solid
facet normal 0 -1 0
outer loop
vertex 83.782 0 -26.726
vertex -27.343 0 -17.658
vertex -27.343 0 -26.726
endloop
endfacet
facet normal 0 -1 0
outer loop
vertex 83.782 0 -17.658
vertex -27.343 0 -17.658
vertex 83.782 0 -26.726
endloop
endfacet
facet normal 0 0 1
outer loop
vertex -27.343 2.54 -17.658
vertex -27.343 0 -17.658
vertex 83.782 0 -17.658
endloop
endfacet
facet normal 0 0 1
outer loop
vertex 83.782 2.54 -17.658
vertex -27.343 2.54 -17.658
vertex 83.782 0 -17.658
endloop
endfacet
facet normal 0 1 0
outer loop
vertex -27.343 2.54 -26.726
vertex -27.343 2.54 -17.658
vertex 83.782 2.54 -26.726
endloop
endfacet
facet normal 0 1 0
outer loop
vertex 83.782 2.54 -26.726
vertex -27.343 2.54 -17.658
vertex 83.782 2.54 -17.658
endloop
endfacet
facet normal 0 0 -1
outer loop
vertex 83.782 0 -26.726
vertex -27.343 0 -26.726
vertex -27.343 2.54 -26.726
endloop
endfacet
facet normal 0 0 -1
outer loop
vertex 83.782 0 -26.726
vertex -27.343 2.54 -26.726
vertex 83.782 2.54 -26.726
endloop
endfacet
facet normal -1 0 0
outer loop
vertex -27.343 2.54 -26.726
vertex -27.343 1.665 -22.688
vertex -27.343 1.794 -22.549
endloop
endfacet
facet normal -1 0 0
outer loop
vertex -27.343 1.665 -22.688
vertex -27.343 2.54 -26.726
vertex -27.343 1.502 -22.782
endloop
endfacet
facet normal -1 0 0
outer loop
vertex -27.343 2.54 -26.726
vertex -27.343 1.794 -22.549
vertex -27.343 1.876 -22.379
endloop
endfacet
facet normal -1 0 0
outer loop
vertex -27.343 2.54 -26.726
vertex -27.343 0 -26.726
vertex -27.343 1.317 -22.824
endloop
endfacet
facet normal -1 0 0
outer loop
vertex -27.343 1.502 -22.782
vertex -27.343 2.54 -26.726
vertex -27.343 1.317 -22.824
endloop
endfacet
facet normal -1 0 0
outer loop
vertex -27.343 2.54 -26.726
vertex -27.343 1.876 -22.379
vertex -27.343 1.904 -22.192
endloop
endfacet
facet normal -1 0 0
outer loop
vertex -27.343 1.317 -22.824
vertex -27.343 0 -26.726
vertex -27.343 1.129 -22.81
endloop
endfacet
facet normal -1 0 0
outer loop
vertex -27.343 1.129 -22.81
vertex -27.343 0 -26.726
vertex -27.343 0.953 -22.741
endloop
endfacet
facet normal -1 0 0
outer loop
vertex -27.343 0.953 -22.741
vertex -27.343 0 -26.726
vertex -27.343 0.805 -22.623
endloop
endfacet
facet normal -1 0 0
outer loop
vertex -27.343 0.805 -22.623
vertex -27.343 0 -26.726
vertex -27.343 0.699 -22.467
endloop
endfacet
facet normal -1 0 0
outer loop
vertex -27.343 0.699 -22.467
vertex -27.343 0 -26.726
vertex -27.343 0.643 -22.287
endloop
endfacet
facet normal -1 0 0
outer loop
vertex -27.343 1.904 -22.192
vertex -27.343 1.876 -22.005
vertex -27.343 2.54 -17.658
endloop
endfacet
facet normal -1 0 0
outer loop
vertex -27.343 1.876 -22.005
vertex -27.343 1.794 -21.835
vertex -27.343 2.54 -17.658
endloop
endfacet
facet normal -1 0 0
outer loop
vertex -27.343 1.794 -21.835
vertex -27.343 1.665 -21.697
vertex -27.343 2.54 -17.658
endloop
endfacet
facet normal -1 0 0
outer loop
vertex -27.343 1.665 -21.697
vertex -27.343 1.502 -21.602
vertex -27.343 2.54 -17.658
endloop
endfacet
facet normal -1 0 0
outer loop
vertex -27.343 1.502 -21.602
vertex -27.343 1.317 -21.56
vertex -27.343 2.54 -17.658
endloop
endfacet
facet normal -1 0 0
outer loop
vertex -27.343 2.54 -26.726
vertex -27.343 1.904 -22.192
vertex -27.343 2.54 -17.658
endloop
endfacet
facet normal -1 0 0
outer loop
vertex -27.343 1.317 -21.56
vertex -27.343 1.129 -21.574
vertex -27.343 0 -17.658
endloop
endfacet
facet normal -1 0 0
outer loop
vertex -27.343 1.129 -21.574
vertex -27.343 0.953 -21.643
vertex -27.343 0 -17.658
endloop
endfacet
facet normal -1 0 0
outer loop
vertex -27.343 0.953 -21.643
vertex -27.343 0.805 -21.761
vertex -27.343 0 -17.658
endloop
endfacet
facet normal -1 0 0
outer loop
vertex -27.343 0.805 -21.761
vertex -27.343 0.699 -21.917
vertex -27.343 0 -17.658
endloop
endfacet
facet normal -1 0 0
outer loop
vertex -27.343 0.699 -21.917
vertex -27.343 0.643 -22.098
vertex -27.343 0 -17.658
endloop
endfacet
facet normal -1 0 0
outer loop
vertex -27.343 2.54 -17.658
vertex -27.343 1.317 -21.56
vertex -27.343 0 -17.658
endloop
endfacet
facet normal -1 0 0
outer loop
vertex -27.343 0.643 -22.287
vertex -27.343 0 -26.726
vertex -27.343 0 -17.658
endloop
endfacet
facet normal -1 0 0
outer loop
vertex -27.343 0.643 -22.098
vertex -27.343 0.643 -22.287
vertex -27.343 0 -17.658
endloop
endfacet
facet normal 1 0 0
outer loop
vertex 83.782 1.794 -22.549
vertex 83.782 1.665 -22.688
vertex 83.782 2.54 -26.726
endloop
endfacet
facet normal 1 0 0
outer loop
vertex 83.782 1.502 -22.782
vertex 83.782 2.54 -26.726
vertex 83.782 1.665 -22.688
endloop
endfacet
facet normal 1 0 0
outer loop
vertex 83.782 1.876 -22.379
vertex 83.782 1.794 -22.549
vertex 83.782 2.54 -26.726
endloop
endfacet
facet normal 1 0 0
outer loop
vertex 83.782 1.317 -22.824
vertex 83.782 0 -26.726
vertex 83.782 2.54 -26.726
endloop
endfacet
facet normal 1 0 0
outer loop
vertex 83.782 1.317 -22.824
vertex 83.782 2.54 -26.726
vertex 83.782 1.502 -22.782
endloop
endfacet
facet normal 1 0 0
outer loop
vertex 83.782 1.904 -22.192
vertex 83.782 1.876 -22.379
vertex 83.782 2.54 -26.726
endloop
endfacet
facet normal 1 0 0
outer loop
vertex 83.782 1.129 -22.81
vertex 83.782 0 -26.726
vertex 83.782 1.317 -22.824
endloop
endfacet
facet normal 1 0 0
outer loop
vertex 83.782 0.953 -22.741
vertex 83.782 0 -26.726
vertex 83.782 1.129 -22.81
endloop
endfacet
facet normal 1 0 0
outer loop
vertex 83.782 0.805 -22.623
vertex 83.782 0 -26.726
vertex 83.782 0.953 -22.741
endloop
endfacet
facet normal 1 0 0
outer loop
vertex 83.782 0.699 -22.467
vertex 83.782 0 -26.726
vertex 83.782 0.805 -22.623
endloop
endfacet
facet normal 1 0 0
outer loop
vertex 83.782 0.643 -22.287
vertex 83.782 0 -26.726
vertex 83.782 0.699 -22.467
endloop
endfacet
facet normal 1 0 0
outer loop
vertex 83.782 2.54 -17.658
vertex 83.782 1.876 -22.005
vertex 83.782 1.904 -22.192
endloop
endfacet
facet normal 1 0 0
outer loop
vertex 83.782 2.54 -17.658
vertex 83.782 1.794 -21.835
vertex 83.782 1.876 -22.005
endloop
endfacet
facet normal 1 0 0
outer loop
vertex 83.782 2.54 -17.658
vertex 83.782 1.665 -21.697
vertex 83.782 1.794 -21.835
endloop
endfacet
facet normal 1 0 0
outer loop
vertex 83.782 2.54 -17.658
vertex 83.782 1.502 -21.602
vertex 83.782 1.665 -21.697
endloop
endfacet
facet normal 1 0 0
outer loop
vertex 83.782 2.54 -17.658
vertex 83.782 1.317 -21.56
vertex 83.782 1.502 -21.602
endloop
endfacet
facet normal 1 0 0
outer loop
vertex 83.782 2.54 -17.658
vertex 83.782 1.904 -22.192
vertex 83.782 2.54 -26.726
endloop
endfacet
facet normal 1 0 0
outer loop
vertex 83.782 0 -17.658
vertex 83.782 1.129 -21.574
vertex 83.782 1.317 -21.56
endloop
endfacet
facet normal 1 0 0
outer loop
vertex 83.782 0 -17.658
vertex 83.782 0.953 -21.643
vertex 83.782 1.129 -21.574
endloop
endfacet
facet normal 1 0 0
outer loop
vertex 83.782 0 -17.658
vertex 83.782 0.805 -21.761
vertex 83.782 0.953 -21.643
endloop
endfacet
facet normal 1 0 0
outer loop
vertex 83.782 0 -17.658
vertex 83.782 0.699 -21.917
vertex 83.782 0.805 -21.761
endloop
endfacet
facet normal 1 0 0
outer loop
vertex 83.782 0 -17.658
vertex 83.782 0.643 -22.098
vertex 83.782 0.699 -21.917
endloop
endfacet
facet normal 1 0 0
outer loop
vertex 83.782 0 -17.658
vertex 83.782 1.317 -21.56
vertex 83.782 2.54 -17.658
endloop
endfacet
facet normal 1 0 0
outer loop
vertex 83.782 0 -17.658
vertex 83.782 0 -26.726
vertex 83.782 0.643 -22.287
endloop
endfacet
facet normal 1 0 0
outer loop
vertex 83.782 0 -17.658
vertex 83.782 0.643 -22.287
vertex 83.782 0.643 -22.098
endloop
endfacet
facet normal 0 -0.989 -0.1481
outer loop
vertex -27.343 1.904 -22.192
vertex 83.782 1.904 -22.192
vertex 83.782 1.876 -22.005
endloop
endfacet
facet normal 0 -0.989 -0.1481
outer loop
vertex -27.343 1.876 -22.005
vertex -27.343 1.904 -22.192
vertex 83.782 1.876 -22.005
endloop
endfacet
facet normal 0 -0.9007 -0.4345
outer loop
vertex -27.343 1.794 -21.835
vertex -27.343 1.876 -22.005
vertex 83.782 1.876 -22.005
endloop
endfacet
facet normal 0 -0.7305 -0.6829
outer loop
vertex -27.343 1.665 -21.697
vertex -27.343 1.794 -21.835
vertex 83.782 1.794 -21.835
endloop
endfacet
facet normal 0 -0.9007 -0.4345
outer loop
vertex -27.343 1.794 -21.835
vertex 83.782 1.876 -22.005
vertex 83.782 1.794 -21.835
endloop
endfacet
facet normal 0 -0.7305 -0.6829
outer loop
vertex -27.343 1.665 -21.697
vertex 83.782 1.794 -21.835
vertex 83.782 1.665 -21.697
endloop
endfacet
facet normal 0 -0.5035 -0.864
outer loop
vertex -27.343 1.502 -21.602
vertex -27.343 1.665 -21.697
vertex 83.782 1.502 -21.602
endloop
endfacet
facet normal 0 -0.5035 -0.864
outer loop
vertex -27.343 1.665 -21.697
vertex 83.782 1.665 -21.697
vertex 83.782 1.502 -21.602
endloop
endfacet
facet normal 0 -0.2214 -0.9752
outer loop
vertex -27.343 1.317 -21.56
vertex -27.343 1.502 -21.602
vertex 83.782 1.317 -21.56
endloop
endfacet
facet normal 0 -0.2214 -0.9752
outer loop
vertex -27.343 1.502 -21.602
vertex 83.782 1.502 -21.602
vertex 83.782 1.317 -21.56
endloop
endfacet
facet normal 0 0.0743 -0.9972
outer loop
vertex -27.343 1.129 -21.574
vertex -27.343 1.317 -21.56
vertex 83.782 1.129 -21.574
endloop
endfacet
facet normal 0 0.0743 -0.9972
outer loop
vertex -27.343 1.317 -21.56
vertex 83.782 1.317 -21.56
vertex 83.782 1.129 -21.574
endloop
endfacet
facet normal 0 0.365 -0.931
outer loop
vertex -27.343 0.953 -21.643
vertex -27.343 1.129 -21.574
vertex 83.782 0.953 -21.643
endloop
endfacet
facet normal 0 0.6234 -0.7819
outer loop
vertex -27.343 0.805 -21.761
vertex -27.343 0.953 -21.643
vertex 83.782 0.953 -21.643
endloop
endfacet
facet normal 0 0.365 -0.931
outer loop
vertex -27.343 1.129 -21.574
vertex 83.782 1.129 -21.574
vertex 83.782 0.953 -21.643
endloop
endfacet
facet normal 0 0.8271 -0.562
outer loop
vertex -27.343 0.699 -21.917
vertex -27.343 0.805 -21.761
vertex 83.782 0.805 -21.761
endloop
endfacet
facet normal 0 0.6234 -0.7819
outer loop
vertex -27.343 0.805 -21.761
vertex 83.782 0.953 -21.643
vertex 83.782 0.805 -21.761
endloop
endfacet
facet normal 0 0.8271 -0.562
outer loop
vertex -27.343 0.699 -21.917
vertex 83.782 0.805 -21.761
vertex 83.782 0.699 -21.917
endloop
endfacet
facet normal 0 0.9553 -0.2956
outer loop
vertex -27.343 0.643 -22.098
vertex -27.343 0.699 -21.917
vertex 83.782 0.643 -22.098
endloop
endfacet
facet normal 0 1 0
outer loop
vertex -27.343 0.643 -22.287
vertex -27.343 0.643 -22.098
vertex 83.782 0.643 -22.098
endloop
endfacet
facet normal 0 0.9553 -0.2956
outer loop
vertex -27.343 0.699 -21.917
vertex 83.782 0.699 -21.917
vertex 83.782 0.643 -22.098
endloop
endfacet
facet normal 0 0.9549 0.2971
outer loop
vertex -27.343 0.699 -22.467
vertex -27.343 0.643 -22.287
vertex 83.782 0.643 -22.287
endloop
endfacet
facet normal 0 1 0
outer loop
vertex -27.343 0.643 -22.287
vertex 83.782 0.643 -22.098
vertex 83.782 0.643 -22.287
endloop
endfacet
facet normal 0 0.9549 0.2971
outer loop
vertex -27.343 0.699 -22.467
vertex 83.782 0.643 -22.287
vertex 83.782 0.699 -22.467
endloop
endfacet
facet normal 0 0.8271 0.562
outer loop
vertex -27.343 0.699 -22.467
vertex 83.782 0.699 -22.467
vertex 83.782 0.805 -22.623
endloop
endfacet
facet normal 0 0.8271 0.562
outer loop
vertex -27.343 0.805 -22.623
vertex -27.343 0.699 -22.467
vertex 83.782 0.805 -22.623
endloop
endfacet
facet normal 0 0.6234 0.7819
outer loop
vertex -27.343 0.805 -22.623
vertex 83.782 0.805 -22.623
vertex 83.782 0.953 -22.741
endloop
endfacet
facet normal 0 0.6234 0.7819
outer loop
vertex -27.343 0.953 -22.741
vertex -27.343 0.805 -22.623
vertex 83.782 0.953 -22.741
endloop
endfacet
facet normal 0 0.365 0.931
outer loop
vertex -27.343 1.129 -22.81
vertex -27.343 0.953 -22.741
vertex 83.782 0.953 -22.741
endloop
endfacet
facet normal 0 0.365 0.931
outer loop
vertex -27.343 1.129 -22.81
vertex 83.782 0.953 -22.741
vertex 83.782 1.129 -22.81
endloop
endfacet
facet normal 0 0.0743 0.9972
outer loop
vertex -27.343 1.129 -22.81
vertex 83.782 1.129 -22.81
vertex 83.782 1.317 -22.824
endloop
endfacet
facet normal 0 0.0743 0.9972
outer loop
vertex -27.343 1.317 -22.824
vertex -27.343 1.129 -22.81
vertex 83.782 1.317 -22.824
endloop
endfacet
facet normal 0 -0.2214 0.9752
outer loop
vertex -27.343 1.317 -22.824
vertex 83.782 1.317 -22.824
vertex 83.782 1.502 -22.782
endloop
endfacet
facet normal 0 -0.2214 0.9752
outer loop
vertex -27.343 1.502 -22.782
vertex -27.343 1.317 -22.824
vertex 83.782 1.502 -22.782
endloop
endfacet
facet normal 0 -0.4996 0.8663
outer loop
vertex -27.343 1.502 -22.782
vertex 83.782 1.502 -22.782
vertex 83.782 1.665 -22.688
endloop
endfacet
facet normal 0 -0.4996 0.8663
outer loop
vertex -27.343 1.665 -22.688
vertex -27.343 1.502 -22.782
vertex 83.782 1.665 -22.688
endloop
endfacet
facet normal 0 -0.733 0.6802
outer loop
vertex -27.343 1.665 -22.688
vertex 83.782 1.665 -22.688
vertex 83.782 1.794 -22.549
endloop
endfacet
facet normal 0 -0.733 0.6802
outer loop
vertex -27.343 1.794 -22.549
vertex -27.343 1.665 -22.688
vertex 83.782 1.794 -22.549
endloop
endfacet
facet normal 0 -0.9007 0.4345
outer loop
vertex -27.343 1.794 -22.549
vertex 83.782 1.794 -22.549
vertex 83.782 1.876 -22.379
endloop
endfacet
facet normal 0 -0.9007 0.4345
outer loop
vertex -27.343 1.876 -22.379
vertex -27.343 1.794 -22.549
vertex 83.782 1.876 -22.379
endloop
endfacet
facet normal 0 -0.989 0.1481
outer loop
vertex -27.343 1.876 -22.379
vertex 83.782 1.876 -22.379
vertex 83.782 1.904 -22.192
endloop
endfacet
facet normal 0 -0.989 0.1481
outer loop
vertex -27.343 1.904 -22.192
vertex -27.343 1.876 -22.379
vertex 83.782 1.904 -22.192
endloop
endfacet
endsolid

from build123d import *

# Parameters (mm, degrees)
F0_W     = 111.125
F0_H     = 9.0678
F1_DEPTH = 2.54
F2_R     = 0.633777
F3_DEPTH = 131.826


with BuildPart() as f1:
    # F0 (on Front) → F1 (new body)
    with BuildSketch(Plane.XZ):
        with Locations((28.219257, -22.19226)):
            Rectangle(F0_W, F0_H)
    extrude(amount=-F1_DEPTH)

    # F2 (on face) → F3 (cut)
    with BuildSketch(Plane.YZ.offset(83.781757)):
        with Locations((1.27, -22.19226)):
            Circle(F2_R)
    extrude(amount=-F3_DEPTH, mode=Mode.SUBTRACT)


solid = f1.part
